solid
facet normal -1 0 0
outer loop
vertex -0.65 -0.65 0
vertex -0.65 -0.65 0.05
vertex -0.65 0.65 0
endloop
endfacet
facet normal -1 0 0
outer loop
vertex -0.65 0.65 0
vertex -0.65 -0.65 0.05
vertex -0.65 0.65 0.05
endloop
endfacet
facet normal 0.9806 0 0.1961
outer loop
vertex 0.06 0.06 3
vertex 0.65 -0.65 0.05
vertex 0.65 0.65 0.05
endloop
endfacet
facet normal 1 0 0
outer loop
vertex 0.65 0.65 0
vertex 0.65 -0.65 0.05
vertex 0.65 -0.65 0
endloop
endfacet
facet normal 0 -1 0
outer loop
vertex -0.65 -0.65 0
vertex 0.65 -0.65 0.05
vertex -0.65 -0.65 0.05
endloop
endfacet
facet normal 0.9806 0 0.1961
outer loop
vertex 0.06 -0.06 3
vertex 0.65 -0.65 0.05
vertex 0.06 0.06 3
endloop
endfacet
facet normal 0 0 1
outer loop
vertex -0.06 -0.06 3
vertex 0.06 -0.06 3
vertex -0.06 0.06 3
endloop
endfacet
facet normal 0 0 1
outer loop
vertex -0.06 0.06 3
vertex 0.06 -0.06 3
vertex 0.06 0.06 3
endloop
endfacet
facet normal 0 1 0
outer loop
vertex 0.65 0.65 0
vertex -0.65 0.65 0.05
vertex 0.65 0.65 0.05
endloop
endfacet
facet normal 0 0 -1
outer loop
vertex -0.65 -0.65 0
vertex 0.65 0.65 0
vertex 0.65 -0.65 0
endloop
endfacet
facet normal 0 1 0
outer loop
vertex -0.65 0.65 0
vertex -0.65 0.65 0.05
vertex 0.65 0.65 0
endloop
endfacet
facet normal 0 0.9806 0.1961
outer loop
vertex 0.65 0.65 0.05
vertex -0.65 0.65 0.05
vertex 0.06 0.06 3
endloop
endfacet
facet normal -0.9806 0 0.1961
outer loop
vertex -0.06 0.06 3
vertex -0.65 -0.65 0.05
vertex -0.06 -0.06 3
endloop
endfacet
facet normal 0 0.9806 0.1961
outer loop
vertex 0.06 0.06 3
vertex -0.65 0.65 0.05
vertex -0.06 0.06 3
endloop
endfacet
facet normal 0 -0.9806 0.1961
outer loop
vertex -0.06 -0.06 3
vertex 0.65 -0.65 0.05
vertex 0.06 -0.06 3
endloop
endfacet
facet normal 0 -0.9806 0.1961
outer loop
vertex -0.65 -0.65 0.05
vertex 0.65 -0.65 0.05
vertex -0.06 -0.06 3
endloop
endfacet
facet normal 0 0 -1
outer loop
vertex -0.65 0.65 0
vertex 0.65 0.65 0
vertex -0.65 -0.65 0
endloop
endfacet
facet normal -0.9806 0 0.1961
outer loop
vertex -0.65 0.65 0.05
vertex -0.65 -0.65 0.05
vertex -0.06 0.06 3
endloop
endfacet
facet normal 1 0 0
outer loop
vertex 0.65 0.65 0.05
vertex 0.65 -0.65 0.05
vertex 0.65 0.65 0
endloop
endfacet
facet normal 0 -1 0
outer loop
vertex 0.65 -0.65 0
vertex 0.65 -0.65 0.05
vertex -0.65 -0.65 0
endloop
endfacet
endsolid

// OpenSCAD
use <lib.scad>

hd = 16;
ld = 8;
vld = 6;

module frameHD($fn=hd) {
	thick=0.1;
	intersection() {
		union() {
			for (x = [-1:2:1]) for (y = [-1:2:1]) hull() {
				translate([0,0,3]) box([thick,thick,thick]);
				translate([x*-0.6,y*-0.6,0]) box([thick,thick,thick]);
			}
			translate([0,0,1.8]) difference() {
				box([0.5,0.5,0.1]);
				box([0.4,0.4,0.2]);
			}
			translate([0,0,0.8]) difference() {
				box([0.9,0.9,0.1]);
				box([0.8,0.8,0.2]);
			}
		}
		translate([0,0,1.5]) box([2,2,3]);
	}
}

module frameLD() {
	frameHD();
}

module ringHD($fn=hd) {
	torus(0.2, 0.6, $fn=$fn*4);
}

module ringLD($fn=hd) {
	torus(0.2, 0.6, $fn=$fn*2);
}

module frameVLD() {
	hull() {
		frameLD();
	}
}

//frameHD();
//frameLD();
frameVLD();
//ringHD();
//ringLD();
